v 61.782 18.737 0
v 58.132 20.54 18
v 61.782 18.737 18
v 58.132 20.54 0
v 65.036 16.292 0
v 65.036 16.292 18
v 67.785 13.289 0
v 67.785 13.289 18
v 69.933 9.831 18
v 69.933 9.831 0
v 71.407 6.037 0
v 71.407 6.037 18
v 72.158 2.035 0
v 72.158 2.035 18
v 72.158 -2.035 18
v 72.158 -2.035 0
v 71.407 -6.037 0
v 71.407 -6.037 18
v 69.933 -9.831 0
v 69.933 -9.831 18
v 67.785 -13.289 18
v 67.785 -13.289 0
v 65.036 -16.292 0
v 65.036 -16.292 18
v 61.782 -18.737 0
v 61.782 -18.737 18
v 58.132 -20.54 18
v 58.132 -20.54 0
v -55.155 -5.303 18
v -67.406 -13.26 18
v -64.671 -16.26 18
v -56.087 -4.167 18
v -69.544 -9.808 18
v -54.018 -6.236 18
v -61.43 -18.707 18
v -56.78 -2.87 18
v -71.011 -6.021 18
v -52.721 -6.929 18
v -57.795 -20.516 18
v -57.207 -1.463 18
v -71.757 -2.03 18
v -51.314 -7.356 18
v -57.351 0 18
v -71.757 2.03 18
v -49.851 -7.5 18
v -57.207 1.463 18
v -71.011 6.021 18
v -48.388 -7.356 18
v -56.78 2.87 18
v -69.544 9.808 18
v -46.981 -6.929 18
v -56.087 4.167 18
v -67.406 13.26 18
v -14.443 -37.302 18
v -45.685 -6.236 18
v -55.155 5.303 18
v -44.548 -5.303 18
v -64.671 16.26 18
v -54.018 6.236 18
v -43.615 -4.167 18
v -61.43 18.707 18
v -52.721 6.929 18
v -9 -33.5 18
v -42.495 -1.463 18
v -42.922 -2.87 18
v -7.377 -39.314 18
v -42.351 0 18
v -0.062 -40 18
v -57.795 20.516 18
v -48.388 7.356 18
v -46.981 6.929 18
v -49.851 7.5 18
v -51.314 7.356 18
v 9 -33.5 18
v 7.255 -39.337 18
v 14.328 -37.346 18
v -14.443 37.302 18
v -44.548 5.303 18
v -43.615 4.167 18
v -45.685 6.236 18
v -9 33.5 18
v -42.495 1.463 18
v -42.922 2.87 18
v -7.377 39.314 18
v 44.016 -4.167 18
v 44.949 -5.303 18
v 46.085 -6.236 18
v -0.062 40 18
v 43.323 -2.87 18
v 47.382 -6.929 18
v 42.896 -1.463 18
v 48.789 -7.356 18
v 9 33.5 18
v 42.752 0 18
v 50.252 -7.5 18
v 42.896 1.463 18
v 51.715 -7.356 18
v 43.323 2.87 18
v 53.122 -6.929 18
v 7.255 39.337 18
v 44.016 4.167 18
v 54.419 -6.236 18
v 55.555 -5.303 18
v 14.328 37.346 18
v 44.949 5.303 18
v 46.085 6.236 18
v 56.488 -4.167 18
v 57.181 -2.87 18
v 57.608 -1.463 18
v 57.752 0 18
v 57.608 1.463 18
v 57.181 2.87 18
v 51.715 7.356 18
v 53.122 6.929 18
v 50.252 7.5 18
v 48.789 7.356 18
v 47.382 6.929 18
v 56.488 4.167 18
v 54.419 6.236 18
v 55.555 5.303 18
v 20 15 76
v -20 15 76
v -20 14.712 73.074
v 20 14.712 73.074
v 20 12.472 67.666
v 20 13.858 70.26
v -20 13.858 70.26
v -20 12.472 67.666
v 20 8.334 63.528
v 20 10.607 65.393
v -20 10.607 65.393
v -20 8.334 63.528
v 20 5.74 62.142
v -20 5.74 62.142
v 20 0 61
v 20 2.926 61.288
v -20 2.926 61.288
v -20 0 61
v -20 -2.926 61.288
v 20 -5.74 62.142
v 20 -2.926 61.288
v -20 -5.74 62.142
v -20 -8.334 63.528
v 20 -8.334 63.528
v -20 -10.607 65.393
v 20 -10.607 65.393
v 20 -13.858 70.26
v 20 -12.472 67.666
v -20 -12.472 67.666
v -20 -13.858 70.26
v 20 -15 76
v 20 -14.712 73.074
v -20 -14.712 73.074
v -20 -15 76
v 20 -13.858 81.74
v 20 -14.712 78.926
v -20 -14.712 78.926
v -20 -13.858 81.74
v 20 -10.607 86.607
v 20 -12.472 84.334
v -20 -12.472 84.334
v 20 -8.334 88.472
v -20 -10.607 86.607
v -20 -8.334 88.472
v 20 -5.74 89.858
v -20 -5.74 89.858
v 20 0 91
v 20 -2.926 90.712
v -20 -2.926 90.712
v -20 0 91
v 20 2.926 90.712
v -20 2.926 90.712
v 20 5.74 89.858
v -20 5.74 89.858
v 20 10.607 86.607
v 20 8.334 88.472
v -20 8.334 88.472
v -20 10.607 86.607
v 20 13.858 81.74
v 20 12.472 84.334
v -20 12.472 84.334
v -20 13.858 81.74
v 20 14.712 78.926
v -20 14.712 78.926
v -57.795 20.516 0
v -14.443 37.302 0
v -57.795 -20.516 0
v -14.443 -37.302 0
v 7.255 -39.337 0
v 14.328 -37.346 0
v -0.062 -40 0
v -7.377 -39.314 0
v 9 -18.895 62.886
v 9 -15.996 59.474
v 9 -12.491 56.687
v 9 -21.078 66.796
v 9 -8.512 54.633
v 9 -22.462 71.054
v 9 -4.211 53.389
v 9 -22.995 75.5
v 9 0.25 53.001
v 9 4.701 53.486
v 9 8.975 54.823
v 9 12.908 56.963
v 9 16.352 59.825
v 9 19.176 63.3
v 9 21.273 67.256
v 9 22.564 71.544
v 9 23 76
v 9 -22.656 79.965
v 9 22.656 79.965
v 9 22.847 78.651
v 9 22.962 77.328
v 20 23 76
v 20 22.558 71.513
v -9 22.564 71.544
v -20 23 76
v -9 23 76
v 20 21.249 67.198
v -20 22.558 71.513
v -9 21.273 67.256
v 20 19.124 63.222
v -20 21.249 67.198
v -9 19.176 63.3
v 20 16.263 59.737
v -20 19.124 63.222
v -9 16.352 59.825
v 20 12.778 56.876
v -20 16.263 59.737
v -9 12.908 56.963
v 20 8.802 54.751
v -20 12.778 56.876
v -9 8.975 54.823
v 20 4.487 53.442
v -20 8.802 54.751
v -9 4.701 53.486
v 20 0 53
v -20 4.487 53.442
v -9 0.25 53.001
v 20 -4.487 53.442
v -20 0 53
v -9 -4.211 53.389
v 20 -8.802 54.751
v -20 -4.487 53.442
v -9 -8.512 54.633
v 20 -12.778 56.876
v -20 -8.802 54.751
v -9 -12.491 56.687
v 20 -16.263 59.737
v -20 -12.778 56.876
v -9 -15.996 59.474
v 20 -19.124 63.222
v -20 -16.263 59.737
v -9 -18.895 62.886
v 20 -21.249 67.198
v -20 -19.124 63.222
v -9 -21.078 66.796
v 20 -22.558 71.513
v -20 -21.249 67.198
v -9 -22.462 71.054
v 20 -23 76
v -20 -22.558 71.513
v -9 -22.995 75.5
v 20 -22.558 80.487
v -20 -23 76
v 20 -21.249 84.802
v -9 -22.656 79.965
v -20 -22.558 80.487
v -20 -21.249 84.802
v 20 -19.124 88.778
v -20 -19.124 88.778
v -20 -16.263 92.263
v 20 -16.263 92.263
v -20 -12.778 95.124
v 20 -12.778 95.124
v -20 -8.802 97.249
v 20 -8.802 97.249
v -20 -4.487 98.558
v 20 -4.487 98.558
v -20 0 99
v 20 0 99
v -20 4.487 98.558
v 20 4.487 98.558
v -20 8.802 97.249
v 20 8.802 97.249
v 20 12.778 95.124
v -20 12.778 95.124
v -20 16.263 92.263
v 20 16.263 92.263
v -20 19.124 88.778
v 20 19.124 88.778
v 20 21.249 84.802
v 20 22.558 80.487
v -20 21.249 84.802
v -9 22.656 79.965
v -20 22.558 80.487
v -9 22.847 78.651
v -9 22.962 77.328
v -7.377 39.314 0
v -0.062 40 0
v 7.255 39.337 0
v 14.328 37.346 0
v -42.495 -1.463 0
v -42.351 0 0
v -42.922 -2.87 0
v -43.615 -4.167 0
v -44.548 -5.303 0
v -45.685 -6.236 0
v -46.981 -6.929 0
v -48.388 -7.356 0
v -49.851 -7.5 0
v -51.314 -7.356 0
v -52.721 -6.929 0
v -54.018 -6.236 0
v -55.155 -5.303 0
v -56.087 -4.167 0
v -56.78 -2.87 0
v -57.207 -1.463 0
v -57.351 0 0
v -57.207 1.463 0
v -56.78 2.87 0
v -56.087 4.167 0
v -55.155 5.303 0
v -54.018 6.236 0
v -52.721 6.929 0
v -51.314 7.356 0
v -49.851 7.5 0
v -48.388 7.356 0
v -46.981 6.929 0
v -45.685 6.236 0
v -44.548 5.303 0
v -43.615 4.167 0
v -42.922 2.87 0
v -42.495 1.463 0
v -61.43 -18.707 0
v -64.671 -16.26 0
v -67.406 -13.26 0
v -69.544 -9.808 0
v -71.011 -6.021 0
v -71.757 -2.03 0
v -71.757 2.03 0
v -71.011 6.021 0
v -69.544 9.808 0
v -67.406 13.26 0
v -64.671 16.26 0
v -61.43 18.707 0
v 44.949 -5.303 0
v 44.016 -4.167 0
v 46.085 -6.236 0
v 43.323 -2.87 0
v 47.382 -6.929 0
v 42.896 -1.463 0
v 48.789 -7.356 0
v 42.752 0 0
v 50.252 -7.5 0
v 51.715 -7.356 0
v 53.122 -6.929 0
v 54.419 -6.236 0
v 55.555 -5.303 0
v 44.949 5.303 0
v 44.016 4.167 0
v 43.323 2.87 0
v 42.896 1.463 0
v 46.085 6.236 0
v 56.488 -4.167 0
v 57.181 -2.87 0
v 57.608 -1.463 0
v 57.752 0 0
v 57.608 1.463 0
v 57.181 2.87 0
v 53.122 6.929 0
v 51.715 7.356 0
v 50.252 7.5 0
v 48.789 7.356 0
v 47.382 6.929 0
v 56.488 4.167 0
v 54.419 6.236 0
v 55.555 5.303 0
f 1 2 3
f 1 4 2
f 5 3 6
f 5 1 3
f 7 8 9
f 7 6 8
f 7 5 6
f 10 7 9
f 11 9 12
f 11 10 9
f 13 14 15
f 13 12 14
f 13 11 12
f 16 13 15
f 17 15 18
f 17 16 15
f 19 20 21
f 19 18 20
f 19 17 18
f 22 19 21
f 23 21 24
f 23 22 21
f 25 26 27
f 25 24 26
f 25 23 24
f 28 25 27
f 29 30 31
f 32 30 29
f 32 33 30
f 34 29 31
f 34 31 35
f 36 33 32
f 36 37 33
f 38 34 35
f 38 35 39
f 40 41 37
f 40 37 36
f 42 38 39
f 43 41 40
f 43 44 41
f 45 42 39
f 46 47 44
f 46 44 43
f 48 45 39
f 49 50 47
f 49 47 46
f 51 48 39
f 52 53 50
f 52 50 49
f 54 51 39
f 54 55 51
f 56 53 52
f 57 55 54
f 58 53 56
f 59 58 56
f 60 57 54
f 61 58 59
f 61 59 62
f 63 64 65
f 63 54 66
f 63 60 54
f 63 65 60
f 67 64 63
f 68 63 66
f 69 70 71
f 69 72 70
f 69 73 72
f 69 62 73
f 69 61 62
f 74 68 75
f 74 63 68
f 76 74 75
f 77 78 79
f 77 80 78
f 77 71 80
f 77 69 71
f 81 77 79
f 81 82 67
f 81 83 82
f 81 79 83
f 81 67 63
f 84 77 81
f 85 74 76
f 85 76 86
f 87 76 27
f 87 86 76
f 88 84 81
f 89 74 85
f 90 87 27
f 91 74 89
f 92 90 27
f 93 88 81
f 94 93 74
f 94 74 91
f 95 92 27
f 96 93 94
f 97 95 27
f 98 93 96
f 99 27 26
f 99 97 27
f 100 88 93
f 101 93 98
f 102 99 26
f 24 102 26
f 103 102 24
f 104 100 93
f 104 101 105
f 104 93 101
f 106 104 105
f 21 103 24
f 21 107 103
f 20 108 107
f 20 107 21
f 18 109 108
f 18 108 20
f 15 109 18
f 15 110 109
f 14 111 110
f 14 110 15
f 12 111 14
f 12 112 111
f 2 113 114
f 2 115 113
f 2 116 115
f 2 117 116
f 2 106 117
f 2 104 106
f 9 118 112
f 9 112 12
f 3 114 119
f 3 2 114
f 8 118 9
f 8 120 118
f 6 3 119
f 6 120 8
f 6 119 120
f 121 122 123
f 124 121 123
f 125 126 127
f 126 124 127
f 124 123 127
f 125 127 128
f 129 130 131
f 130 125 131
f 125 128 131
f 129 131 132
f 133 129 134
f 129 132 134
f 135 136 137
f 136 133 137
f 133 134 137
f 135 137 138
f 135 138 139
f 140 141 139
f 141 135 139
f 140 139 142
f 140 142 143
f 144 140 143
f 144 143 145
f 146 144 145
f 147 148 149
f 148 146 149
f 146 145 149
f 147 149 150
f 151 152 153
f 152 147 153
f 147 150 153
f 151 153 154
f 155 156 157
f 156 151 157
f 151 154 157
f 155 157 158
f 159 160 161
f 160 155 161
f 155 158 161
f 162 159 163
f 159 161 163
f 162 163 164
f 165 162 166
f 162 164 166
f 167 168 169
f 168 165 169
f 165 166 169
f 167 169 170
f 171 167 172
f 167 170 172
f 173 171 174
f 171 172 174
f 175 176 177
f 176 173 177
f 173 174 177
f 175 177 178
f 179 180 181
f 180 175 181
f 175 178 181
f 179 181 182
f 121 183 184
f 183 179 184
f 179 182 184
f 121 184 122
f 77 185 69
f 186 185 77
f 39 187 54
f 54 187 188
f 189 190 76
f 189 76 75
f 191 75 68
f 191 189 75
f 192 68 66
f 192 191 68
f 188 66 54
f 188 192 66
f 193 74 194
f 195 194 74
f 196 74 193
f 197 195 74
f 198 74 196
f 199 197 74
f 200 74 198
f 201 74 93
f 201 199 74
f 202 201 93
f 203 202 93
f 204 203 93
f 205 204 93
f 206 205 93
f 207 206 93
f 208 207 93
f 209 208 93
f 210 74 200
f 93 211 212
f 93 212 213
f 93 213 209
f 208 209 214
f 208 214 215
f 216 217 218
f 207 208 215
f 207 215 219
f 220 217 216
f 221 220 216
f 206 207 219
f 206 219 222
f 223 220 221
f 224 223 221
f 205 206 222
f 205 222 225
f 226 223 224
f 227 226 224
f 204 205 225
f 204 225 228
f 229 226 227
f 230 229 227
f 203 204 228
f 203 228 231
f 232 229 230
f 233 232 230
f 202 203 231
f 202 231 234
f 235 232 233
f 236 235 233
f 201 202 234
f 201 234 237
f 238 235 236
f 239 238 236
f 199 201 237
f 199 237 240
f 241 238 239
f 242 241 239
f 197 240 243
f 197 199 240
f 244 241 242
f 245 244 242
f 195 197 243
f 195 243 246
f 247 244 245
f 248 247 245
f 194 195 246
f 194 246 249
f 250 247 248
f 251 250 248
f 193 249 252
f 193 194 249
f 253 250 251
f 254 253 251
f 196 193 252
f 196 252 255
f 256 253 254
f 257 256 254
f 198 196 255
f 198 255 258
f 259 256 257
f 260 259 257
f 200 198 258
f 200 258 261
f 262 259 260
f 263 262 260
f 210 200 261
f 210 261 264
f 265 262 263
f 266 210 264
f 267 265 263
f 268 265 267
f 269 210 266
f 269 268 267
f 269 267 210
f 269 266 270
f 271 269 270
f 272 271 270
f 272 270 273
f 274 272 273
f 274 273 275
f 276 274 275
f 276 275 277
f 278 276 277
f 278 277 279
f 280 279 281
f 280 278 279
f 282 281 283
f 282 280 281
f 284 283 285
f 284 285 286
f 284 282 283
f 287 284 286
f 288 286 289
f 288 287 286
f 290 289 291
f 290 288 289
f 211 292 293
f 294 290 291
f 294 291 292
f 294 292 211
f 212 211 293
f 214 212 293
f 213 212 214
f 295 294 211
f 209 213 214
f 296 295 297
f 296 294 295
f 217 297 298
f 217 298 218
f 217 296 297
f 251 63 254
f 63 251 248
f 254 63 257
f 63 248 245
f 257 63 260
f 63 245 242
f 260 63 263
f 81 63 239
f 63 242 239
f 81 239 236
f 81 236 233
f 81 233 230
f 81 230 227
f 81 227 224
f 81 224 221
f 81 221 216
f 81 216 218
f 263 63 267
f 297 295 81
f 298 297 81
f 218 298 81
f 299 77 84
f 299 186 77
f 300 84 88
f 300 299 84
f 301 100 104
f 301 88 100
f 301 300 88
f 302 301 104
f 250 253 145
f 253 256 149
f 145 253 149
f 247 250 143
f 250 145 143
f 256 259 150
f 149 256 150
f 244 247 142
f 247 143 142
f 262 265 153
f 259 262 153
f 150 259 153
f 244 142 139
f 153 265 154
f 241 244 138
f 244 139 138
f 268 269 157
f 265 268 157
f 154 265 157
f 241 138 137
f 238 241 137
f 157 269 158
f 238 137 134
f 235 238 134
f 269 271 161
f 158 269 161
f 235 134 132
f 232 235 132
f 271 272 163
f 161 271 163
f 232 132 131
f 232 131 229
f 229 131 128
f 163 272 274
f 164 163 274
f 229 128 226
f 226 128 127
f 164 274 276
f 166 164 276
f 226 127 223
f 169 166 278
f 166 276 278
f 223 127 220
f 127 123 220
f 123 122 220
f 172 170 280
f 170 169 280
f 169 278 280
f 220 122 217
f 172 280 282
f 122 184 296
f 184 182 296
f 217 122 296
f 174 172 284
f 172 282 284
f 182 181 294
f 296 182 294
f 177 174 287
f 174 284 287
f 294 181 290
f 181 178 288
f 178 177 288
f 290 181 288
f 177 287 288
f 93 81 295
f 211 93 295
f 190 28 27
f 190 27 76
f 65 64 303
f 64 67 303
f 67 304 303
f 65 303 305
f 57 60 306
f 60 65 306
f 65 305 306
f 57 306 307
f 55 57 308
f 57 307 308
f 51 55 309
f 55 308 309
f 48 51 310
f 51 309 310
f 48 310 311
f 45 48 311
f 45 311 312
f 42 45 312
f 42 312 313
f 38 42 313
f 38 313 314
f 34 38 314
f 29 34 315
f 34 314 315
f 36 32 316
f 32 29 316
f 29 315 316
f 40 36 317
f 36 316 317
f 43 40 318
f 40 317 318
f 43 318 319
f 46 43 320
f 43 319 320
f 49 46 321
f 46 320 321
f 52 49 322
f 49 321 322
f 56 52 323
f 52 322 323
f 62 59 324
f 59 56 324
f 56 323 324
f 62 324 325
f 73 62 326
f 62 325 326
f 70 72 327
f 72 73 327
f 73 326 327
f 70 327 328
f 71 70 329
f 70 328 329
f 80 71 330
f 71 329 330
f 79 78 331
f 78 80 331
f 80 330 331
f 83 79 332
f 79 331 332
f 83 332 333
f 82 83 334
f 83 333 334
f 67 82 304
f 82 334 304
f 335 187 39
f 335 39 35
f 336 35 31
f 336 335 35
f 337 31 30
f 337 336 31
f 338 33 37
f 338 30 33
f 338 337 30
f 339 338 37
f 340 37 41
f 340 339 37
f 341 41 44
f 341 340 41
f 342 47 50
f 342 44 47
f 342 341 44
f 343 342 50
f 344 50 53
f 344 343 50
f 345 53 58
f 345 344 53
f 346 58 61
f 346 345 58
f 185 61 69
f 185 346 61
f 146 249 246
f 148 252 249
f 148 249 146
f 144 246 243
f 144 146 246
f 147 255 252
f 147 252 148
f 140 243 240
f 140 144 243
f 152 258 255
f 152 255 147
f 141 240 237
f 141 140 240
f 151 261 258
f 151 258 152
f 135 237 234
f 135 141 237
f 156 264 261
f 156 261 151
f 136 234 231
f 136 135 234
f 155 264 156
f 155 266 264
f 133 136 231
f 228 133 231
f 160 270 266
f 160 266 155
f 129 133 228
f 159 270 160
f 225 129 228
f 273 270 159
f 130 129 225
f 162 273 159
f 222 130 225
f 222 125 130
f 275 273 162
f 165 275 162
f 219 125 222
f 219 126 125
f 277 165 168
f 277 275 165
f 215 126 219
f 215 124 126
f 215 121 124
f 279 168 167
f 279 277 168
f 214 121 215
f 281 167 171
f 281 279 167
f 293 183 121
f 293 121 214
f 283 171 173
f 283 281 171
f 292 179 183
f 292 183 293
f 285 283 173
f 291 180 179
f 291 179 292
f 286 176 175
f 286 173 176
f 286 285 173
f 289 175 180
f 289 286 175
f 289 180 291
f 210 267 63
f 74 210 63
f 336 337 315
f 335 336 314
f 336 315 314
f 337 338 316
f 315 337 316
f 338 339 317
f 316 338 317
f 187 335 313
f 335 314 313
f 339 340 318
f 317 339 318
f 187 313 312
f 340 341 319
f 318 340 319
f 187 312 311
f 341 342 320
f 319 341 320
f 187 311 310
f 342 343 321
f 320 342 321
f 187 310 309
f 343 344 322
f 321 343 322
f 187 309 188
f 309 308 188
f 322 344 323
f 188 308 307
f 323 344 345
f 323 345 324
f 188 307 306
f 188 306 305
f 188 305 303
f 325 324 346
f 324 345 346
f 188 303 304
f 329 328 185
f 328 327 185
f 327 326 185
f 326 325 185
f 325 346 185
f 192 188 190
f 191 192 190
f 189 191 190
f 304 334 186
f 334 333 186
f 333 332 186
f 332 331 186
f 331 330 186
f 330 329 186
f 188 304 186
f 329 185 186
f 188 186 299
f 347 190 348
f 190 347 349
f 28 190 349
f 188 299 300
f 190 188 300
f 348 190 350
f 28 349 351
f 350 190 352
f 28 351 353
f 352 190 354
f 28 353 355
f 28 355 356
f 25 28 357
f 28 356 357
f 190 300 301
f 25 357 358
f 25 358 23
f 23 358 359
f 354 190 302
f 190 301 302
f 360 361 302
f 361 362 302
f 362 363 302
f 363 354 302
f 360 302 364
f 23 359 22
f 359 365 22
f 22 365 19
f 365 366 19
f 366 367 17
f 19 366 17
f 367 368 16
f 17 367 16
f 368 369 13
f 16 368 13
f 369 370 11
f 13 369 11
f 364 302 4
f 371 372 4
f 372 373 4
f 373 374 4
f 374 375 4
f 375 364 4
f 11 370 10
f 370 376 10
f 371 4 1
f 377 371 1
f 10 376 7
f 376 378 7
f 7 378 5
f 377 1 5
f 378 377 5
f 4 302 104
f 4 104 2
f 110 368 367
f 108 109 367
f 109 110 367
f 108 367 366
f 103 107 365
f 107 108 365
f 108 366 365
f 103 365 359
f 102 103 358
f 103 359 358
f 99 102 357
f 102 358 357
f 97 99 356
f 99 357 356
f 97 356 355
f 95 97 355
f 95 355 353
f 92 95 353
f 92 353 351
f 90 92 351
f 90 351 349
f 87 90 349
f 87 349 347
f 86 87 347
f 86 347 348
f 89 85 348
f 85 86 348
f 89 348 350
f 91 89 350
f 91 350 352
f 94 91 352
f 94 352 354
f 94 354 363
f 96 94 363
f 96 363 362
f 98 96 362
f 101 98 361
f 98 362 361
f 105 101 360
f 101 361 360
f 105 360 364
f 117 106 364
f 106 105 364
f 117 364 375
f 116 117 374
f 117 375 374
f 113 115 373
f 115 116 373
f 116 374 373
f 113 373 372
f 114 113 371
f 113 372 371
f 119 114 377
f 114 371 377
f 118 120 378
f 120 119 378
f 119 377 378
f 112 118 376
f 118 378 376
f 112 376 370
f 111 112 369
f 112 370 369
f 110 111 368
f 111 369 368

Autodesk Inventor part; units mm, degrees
sketch "Sketch1" plane through (0, 0, 0) normal (0, 0, 1) x (1, 0, 0)
  circle A0 centre (-49.8513, 0) radius 7.5
  circle A1 centre (50.2519, 0) radius 7.5
  line L0 (-57.7949, 20.5158) -> (-14.443, 37.3015)
  arc A2 (-57.7949, 20.5158) -> (-57.7949, -20.5158) centre (-49.8513, 0) ccw
  arc A3 (58.1322, -20.5402) -> (58.1322, 20.5402) centre (50.2519, 0) ccw
  line L1 (14.3278, 37.3459) -> (58.1322, 20.5402)
  line L2 (58.1322, -20.5402) -> (14.3278, -37.3459)
  line L3 (-57.7949, -20.5158) -> (-14.443, -37.3015)
  arc A4 (-14.443, -37.3015) -> (14.3278, -37.3459) centre (0, 0) ccw
  arc A5 (14.3278, 37.3459) -> (-14.443, 37.3015) centre (0, 0) ccw
  dimension "d19" = 15
  dimension "d20" = 15
  dimension "d45" = 44
  dimension "d46" = 44
  dimension "d47" = 0
  dimension "d48" = 0
sketch "Sketch2" plane through (0, 0, 0) normal (1, 0, 0) x (0, 1, 0)
  line L0 (-20.5849, 0) -> (20.5849, 0) projected
  line L1 (20.5849, 0) -> (20.5849, 18) projected
  line L2 (-20.5849, 18) -> (-20.5849, 18) projected
  line L3 (-20.5849, 0) -> (-20.5849, 18) projected
  line L4 (-20.5849, 18) -> (-20.5849, 18) projected
  line L5 (-33.5, 18) -> (33.5, 18)
  line L6 (33.5, 18) -> (22.6557, 79.9649)
  line L7 (-22.6557, 79.9649) -> (-33.5, 18)
  circle A0 centre (0, 76) radius 23
  circle A1 centre (0, 76) radius 15
  point P0 (0, 0)
  dimension "d23" = 67
  dimension "d25" = 0
  dimension "d27" = 33.5
  dimension "d37" = 30
  dimension "d38" = 46
  dimension "d39" = 58
extrude "Extrusion5" add sketch "Sketch2" along normal mid plane 18 contours L5 L7 A0 L6
extrude "Extrusion6" add sketch "Sketch2" along normal mid plane 40 contours A0
extrude "Extrusion7" add sketch "Sketch1" along normal blind 18
properties part number "6.2_DATE11_1"
